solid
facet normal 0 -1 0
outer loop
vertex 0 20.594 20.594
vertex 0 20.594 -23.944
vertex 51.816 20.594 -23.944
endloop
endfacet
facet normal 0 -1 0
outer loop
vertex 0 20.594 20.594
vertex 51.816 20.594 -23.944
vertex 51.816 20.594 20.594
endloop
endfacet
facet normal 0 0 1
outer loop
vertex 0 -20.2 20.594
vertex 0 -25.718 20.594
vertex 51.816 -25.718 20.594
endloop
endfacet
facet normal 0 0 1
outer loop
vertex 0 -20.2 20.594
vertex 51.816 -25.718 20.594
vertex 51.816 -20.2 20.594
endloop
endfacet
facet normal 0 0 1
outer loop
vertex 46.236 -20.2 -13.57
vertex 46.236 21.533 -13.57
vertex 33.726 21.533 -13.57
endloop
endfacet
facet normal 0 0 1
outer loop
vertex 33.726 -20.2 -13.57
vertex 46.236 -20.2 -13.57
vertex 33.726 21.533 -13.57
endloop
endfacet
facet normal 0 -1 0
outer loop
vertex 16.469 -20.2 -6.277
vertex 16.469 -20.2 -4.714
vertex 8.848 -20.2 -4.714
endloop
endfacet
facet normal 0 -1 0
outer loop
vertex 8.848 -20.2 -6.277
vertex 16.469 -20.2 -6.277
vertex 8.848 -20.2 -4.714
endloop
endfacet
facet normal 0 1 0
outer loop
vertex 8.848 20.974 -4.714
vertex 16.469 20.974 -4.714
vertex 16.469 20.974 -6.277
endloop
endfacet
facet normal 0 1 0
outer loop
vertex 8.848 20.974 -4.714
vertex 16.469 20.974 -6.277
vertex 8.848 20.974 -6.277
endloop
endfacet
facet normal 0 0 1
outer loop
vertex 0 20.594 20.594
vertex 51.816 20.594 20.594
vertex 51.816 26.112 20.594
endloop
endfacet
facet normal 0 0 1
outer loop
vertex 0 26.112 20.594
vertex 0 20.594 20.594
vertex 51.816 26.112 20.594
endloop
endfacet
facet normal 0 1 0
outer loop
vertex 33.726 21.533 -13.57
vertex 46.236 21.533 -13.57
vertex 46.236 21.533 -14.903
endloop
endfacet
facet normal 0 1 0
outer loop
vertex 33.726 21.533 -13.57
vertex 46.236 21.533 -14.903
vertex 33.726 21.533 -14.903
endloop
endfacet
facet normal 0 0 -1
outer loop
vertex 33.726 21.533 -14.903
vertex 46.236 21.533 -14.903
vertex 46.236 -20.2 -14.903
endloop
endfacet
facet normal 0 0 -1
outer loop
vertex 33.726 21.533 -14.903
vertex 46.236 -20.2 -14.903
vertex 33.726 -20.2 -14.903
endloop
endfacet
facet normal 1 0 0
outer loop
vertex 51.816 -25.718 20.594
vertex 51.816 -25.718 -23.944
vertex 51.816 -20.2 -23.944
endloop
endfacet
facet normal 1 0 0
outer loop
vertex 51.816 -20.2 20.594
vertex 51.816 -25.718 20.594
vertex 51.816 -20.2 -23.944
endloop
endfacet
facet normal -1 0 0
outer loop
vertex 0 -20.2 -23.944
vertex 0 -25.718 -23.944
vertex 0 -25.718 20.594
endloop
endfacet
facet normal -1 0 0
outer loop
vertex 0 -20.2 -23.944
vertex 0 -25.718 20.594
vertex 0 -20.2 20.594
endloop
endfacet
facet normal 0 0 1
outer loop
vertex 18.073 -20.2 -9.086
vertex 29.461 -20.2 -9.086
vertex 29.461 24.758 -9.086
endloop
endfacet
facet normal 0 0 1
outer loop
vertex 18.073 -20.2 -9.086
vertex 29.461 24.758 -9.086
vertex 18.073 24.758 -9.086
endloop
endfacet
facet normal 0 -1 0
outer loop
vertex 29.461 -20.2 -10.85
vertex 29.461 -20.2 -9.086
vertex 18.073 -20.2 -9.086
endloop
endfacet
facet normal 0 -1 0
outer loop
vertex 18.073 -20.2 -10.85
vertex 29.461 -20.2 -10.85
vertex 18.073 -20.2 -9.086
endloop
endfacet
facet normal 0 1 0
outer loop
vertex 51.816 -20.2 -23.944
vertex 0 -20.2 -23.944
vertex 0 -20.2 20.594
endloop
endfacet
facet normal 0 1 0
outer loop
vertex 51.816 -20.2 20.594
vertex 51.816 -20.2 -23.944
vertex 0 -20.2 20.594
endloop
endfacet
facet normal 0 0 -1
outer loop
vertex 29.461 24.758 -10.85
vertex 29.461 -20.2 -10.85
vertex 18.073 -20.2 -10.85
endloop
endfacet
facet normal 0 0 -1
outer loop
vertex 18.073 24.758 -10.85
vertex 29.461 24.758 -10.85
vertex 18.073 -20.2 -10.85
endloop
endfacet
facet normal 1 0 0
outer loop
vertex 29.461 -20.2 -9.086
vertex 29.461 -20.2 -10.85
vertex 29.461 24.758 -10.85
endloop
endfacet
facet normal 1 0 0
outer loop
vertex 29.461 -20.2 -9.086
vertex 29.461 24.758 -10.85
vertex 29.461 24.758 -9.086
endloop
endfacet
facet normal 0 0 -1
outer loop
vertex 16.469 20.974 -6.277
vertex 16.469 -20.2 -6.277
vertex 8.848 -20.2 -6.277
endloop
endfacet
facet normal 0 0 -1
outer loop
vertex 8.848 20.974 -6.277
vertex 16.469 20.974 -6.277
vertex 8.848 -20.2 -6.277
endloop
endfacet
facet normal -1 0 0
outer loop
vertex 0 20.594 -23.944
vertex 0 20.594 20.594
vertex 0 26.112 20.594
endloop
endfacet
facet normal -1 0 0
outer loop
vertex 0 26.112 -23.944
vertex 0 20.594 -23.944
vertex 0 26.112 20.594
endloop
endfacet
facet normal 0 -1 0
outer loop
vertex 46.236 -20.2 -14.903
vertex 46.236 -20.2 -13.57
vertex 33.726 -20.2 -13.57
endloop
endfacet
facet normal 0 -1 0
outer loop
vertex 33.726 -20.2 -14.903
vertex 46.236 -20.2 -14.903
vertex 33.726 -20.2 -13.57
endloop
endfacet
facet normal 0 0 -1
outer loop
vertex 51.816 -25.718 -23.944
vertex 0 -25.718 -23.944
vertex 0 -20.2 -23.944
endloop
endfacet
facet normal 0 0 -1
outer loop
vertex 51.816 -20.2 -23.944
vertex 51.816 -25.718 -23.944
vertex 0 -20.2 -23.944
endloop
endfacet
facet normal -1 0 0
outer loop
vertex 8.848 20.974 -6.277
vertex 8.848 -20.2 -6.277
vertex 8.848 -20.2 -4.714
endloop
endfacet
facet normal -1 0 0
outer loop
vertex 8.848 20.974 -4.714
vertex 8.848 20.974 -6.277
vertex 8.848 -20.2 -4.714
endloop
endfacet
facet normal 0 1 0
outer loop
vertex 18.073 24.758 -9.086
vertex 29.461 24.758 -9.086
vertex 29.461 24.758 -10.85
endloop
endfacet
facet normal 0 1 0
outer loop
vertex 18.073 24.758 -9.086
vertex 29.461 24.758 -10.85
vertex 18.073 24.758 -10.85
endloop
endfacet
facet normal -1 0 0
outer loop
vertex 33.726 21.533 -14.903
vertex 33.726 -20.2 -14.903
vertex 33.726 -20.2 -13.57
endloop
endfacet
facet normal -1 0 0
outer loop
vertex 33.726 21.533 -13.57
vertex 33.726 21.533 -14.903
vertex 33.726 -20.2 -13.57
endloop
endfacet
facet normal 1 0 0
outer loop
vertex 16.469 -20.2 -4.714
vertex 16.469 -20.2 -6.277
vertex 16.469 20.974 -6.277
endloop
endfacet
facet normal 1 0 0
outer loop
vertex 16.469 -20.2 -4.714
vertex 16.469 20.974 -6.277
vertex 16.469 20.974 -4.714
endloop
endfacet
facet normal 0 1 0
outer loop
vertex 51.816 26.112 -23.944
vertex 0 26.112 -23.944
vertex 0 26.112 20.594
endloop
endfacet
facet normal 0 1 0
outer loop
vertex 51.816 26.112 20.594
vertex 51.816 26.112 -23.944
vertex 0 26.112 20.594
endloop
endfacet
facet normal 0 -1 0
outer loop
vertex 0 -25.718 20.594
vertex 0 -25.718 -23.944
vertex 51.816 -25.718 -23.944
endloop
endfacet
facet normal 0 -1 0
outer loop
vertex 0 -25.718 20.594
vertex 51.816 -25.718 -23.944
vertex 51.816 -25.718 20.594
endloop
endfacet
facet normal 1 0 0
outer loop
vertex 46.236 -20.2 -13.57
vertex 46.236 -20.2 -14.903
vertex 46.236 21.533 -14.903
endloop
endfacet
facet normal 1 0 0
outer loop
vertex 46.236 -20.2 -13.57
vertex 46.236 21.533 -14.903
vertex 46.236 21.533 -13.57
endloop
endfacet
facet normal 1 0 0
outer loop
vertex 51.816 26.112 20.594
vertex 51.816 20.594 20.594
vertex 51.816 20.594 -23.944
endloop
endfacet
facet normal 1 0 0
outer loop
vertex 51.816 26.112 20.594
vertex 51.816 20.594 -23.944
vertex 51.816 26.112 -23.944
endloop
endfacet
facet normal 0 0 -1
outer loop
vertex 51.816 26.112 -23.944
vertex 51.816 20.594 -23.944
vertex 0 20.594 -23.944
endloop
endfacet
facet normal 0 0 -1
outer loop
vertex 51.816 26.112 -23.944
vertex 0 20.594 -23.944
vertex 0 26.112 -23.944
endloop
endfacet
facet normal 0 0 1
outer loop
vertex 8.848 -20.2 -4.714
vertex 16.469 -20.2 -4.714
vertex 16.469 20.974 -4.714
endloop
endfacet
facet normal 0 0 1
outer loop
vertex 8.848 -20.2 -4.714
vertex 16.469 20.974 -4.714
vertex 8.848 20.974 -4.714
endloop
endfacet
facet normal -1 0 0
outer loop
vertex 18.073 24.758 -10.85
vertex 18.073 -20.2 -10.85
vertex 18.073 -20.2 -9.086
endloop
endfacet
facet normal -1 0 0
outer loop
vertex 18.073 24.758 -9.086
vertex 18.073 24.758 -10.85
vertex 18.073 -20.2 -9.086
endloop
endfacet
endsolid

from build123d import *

# Parameters (mm, degrees)
F0_W     = 5.517931
F0_H     = 44.537588
F0_W_2   = 5.517932
F1_DEPTH = 51.816
F2_W     = 12.510221
F2_H     = 1.333464
F3_DEPTH = 41.7322
F4_W     = 11.388663
F4_H     = 1.764399
F5_DEPTH = 44.958
F6_W     = 7.620854
F6_H     = 1.563235
F7_DEPTH = 41.1734


with BuildPart() as f1:
    # F0 (on Right) → F1 (new body)
    with BuildSketch(Plane.YZ):
        with Locations((23.352669, -1.675087)):
            Rectangle(F0_W, F0_H)
        with Locations((-22.958535, -1.675087)):
            Rectangle(F0_W_2, F0_H)
    extrude(amount=F1_DEPTH)


with BuildPart() as f3:
    # F2 (on face) → F3 (new body)
    with BuildSketch(Plane(origin=(0, -20.199569, 0), x_dir=(-1, 0, 0), z_dir=(0, 1, 0))):
        with Locations((-39.980774, -14.236348)):
            Rectangle(F2_W, F2_H)
    extrude(amount=F3_DEPTH)


with BuildPart() as f5:
    # F4 (on face) → F5 (new body)
    with BuildSketch(Plane(origin=(0, -20.199569, 0), x_dir=(-1, 0, 0), z_dir=(0, 1, 0))):
        with Locations((-23.766953, -9.96829)):
            Rectangle(F4_W, F4_H)
    extrude(amount=F5_DEPTH)


with BuildPart() as f7:
    # F6 (on face) → F7 (new body)
    with BuildSketch(Plane(origin=(0, -20.199569, 0), x_dir=(-1, 0, 0), z_dir=(0, 1, 0))):
        with Locations((-12.658243, -5.495236)):
            Rectangle(F6_W, F6_H)
    extrude(amount=F7_DEPTH)


solid = Compound([f1.part, f3.part, f5.part, f7.part])
